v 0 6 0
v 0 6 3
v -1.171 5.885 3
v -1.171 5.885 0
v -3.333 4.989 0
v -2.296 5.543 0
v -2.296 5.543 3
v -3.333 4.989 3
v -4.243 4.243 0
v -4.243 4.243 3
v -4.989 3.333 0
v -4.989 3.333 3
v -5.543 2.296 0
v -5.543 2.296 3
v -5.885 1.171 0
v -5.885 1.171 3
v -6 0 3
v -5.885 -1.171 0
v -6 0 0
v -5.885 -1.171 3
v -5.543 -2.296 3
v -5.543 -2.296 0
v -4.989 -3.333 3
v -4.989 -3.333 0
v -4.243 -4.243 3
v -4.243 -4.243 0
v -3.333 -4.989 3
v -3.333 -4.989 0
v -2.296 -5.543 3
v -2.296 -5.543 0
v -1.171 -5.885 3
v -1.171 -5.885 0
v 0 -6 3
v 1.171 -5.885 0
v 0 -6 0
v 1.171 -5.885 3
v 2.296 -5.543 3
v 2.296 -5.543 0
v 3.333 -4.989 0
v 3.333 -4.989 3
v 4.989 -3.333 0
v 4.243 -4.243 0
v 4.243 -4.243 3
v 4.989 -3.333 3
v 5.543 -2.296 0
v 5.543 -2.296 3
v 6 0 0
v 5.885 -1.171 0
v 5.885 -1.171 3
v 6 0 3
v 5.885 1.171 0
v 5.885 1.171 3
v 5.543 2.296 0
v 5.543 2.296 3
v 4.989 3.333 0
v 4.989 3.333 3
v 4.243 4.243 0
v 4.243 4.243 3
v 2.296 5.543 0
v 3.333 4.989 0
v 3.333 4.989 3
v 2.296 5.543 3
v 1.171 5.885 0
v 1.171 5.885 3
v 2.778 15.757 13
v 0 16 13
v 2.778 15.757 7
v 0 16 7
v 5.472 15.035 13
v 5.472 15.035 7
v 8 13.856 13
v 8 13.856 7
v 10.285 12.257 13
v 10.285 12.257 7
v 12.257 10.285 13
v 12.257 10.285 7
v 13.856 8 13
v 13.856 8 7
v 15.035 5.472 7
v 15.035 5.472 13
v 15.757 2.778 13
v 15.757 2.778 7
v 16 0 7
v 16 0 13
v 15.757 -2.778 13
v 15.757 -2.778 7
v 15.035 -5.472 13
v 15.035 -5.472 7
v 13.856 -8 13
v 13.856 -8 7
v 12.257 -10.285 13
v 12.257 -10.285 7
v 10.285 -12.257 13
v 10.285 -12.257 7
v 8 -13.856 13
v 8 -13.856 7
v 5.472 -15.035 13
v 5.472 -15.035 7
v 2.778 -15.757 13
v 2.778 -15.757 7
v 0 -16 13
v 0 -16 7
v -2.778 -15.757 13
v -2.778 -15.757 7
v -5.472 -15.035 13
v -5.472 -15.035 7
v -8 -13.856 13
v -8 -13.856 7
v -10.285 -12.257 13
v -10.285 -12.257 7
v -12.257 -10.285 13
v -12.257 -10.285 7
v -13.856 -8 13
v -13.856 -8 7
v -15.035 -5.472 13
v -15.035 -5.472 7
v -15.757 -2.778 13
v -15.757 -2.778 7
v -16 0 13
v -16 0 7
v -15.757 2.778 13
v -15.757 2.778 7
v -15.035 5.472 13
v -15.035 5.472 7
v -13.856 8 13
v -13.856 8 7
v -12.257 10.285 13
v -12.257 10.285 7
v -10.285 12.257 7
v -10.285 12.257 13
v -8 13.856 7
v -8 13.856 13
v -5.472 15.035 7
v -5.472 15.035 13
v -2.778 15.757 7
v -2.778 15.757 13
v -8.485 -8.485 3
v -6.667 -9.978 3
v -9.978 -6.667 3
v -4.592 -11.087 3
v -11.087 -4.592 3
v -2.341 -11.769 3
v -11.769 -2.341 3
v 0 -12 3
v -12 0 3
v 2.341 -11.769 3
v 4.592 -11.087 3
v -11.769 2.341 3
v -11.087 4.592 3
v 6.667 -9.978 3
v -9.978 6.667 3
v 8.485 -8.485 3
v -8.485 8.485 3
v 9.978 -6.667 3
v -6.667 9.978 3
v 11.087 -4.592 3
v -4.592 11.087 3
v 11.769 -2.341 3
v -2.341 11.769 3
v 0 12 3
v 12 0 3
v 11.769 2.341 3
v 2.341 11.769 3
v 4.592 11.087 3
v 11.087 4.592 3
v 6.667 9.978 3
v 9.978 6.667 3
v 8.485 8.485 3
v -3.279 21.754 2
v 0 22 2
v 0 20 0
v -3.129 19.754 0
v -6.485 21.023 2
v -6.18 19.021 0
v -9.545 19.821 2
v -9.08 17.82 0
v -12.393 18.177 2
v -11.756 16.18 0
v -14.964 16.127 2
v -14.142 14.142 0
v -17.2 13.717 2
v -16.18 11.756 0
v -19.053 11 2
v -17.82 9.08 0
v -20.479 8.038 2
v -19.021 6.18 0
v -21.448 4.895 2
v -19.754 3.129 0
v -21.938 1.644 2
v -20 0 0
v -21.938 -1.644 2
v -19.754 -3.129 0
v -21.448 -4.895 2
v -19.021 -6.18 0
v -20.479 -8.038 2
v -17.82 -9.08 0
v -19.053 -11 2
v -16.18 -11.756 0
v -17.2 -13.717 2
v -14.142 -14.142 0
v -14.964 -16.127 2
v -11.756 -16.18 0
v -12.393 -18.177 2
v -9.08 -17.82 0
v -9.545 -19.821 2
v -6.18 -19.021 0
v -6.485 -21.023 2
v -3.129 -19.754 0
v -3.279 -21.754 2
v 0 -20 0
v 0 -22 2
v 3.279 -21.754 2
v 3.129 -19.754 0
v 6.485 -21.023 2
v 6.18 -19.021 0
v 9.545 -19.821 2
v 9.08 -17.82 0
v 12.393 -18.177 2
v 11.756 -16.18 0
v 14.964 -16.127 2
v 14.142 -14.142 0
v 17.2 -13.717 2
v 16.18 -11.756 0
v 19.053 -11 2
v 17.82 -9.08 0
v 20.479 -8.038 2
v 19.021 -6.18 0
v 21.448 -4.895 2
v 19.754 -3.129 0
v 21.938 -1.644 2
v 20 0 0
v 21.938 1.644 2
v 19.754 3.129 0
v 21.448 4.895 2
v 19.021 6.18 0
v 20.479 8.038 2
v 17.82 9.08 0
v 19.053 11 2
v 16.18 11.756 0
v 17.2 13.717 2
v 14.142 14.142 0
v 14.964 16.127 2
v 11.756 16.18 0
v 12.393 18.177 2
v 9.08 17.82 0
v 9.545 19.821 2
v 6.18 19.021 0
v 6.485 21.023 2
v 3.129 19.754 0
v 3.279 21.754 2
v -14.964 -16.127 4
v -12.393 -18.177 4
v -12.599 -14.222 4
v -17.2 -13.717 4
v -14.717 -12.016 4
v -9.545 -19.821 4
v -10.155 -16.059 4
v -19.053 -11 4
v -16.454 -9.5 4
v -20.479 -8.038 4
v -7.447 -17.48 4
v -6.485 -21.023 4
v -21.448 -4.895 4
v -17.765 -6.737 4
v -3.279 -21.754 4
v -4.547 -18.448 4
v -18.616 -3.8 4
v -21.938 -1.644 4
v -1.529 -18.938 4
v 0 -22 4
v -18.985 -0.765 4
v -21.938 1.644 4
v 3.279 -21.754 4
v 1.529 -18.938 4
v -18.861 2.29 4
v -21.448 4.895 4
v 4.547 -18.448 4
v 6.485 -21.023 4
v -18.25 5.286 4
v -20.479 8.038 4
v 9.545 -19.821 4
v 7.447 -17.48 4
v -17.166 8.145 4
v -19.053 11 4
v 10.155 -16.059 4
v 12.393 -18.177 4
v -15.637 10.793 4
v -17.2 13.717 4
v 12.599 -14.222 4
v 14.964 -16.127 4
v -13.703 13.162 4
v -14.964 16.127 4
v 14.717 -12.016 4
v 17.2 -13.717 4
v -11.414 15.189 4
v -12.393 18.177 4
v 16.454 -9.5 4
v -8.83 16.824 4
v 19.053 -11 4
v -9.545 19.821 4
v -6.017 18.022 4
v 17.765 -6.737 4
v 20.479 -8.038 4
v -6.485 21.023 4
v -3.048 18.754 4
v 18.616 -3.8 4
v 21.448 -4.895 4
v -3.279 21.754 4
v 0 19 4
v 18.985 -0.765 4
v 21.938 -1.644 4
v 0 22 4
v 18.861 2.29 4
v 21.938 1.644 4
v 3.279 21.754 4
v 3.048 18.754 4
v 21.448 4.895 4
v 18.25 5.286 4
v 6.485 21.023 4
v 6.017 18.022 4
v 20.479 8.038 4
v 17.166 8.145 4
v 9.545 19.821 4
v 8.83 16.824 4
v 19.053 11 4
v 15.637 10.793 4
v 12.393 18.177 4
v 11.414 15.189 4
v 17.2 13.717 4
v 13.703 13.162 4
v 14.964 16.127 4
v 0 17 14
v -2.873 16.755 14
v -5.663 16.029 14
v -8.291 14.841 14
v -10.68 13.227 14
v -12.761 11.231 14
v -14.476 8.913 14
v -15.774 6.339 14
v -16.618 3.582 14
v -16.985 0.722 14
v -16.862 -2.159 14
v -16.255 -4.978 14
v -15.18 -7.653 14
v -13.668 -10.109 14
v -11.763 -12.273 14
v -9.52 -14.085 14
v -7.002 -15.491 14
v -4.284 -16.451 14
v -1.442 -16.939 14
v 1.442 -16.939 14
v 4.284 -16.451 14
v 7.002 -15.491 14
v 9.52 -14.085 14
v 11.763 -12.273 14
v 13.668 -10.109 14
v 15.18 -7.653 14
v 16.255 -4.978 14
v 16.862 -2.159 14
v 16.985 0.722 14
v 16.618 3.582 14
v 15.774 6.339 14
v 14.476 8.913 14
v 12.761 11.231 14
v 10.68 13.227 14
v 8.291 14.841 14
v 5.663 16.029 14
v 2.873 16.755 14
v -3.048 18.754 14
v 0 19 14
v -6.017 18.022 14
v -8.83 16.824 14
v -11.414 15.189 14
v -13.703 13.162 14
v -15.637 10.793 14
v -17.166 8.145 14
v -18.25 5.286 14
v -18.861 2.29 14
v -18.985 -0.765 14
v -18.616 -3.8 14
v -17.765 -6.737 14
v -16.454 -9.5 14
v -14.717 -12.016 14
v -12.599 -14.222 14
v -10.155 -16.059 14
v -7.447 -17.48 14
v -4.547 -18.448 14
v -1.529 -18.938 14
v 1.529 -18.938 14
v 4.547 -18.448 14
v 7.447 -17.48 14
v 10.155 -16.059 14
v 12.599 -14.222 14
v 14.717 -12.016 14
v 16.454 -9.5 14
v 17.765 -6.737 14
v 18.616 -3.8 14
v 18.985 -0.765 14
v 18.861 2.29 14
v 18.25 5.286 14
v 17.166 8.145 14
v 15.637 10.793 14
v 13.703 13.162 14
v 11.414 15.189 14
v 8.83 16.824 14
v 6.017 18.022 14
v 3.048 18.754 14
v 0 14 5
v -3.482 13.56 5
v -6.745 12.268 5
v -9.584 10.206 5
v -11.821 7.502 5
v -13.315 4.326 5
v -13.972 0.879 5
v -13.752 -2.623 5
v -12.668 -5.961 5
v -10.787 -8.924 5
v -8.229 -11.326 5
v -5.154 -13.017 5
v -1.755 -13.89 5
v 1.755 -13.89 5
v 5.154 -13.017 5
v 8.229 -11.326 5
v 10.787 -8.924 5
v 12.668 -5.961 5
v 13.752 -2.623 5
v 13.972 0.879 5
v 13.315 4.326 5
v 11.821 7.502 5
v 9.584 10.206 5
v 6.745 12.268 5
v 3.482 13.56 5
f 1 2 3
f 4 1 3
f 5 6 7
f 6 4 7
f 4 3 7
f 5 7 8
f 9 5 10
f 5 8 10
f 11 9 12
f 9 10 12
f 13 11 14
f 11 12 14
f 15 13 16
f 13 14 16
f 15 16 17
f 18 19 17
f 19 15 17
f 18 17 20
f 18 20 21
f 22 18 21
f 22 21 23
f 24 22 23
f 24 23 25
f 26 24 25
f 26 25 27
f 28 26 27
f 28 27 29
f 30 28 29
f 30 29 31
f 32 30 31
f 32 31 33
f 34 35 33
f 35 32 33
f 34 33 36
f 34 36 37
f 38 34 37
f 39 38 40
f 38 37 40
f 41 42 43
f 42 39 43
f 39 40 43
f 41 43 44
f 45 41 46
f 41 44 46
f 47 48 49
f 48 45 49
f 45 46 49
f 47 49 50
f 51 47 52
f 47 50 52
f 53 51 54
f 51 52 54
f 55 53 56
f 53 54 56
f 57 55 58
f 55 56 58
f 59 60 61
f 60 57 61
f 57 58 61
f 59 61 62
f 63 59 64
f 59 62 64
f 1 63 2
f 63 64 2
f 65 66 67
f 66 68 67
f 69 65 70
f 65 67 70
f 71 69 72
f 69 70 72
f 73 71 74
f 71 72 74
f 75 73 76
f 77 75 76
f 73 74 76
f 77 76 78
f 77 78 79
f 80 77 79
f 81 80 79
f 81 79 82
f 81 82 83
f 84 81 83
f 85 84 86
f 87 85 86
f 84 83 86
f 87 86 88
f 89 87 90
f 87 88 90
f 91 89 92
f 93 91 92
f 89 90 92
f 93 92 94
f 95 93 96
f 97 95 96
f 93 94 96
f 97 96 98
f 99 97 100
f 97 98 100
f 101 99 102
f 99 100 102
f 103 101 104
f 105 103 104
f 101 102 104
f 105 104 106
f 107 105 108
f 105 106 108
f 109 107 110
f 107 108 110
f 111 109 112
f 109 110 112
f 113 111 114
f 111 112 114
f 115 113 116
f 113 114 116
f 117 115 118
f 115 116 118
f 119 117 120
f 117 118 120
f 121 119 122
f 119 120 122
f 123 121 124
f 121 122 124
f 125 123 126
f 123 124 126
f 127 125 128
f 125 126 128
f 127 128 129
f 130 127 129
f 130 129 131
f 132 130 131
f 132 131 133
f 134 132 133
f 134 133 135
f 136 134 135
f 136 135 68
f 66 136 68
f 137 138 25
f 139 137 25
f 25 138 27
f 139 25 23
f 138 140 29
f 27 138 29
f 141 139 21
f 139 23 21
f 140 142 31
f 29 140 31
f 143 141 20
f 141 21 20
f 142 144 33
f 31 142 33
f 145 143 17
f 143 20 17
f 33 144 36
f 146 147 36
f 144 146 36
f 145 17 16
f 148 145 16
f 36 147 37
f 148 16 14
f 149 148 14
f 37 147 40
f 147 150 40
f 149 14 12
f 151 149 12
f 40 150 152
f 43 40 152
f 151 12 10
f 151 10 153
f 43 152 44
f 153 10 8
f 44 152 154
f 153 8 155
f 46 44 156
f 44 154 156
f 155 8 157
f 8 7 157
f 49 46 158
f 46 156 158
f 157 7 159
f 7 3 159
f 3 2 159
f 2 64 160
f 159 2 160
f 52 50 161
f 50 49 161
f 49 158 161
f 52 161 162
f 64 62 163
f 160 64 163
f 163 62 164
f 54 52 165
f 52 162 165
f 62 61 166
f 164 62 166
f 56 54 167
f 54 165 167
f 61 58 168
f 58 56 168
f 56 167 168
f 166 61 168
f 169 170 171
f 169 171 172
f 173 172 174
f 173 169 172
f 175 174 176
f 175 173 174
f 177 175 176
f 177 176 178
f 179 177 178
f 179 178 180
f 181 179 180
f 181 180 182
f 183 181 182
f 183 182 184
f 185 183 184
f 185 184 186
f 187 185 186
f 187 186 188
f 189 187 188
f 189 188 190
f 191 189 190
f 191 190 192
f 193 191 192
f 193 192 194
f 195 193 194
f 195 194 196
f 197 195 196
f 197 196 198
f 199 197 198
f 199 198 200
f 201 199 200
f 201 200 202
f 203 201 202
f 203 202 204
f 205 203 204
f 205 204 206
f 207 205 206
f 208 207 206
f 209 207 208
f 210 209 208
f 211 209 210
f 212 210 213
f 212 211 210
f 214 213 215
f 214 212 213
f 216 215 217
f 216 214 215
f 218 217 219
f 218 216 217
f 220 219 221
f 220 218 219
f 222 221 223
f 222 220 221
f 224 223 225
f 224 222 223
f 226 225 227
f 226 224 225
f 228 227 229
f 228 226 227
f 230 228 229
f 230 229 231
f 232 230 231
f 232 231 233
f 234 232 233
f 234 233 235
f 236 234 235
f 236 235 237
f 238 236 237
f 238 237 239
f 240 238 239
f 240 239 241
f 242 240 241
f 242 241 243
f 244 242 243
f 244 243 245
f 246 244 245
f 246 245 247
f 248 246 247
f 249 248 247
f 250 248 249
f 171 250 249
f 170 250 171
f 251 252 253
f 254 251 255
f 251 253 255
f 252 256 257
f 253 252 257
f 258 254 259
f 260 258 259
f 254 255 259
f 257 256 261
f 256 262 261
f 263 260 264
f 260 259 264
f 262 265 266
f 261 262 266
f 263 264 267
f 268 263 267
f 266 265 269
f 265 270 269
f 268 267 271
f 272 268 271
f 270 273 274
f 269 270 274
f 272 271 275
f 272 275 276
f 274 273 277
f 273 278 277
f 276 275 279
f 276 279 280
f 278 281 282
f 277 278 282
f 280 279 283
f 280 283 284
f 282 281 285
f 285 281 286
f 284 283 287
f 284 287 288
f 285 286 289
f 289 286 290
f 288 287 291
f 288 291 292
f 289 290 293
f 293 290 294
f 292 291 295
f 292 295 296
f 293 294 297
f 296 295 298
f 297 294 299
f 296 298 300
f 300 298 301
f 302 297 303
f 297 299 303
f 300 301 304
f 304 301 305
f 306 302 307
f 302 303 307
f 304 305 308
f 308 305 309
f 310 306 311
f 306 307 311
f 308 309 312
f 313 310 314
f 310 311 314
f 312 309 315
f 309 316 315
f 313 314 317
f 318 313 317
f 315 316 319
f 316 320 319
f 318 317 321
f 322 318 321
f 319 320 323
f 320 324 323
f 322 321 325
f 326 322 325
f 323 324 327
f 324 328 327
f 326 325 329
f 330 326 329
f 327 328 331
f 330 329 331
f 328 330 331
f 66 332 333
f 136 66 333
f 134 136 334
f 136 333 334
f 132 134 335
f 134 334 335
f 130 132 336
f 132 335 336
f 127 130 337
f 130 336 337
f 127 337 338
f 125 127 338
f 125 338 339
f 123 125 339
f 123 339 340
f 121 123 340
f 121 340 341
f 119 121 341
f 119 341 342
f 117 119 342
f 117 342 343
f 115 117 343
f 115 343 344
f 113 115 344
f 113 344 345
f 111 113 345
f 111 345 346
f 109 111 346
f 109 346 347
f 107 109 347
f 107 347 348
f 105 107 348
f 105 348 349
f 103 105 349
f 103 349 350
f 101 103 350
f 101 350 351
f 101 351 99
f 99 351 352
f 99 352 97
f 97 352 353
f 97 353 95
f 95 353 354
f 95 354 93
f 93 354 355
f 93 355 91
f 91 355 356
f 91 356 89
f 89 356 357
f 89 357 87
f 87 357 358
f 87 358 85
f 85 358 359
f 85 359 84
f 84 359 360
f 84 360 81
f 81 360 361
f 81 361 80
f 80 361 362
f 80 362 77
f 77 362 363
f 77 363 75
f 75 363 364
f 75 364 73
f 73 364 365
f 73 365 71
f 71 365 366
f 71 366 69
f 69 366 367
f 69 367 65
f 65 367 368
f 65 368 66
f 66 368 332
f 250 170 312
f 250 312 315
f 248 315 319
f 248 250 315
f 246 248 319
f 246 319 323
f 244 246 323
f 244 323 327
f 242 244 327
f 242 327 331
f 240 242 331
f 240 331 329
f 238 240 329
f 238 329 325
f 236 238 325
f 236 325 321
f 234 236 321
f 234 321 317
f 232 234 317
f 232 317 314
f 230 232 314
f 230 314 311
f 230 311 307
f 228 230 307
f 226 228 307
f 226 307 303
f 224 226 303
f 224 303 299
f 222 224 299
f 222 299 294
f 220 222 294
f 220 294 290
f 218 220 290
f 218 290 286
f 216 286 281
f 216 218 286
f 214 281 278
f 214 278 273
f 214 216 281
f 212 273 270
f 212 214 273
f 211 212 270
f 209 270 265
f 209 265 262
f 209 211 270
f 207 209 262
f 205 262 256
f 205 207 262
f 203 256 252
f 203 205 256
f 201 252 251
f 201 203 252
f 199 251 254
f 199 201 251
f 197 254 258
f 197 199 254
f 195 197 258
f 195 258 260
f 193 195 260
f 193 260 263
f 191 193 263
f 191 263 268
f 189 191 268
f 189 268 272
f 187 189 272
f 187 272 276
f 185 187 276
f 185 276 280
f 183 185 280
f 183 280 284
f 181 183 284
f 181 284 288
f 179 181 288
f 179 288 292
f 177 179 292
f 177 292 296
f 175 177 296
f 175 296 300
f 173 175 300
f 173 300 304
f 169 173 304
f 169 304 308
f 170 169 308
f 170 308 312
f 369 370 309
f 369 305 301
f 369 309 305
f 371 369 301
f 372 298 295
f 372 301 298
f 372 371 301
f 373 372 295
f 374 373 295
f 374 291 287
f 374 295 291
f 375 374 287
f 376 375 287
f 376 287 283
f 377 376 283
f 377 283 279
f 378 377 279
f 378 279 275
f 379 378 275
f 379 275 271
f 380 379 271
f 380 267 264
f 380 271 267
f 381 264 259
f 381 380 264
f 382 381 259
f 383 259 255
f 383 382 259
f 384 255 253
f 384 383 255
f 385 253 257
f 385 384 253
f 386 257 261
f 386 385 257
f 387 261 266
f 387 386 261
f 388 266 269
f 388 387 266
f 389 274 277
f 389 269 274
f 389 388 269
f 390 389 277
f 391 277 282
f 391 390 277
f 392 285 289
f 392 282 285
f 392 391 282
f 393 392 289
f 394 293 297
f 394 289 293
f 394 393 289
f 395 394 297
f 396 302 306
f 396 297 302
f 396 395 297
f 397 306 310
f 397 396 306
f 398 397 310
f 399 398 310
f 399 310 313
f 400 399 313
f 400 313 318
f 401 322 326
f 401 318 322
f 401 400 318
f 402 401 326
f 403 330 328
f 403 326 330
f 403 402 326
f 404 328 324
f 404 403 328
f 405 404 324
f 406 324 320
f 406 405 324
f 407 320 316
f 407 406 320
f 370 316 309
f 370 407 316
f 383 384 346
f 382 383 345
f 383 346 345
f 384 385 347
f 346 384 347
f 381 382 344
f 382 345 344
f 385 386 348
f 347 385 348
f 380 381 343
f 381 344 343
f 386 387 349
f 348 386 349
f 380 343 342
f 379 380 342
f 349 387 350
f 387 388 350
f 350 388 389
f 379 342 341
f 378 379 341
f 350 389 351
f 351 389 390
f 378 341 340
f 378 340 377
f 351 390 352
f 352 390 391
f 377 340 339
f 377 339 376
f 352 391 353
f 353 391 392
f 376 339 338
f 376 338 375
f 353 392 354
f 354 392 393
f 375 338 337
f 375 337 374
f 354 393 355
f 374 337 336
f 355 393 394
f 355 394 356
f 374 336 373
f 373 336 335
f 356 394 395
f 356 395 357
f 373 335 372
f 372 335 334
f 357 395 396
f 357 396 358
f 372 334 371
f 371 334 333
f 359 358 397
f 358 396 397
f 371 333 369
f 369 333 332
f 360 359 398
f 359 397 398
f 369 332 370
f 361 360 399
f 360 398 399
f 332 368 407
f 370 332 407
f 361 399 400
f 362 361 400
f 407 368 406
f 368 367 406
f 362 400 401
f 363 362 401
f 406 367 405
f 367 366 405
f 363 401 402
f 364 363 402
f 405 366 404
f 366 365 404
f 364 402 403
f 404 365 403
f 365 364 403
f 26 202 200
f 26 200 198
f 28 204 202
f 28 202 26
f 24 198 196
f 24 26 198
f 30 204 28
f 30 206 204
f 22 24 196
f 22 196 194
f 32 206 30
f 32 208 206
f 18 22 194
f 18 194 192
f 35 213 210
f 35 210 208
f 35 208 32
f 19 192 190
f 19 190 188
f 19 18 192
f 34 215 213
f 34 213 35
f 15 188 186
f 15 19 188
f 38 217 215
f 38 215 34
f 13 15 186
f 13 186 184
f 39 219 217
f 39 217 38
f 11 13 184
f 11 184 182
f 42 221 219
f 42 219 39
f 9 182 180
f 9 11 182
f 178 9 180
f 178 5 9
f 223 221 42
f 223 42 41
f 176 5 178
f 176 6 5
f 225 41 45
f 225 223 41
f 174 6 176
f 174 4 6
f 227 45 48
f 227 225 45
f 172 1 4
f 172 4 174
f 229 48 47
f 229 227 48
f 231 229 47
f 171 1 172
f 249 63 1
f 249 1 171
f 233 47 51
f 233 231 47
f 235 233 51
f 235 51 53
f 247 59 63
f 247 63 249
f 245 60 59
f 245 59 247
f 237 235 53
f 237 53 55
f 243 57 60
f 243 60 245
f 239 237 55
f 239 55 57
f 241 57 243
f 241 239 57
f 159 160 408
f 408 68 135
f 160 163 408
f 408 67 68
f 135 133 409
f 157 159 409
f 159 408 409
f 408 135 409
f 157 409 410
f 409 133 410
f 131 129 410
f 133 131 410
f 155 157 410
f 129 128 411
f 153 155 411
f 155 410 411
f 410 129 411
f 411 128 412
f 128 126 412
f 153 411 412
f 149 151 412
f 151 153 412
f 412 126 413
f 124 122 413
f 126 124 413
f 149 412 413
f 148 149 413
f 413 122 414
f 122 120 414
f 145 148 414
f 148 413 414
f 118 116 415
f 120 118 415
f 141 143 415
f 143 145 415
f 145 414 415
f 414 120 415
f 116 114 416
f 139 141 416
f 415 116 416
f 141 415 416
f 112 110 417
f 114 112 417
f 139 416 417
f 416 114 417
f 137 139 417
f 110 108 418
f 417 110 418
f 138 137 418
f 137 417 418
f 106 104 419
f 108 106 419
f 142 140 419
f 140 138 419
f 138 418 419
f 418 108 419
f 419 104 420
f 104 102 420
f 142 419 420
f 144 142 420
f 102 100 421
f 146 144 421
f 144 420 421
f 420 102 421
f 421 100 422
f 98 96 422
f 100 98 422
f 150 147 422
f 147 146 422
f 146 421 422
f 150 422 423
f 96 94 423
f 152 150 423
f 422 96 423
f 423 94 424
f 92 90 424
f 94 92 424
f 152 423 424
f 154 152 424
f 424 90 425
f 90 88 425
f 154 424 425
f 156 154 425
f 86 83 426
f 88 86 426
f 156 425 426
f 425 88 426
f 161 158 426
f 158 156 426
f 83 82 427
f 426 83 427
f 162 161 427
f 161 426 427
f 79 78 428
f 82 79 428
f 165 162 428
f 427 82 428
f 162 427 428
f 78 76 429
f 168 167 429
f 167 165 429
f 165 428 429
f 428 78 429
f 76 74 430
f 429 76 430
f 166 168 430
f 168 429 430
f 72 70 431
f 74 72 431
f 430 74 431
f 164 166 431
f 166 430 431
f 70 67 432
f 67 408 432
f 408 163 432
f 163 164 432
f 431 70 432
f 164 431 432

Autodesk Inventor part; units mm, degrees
ref_plane "YZ Plane" through (0, 0, 0) normal (1, 0, 0) x (0, 1, 0)
ref_plane "XZ Plane" through (0, 0, 0) normal (0, 1, 0) x (-1, 0, 0)
ref_plane "XY Plane" through (0, 0, 0) normal (0, 0, 1) x (1, 0, 0)
sketch "Esquisse1" plane through (0, 0, 0) normal (1, 0, 0) x (0, 1, 0)
  line L0 (22, 4) -> (22, 0)
  line L1 (22, 4) -> (19, 4)
  line L2 (19, 4) -> (19, 14)
  line L3 (19, 14) -> (16, 14)
  line L4 (16, 14) -> (16, 3)
  line L5 (22, 0) -> (6, 0)
  line L6 (6, 0) -> (6, 3)
  line L7 (6, 3) -> (16, 3)
  line L8 (0, 0) -> (0, -5.3906)
  dimension "d0" = 4
  dimension "d2" = 10
  dimension "d3" = 3
  dimension "d4" = 12
  dimension "d7" = 38
  dimension "d8" = 3
  dimension "d9" = 3
revolve "Révolution1" add sketch "Esquisse1" angle 360 about axis through (0, 0, 0) along (0, 0, -1)
chamfer "Chanfrein1" distance 2 angle 45 1 edges at (0, -22, 0)
chamfer "Chanfrein2" distance 4 angle 45 1 edges at (0, -16, 3)
thread "Filetage1" size "M38x1.5" class "6g" standard "ISO Metric profile" length 10
chamfer "Chanfrein3" distance 1 angle 45 1 edges at (0, -16, 14)
thread "Filetage2" size "M12x1" class "6H" standard "ISO Metric profile" full length
properties part number "reservoir_cullasse"
